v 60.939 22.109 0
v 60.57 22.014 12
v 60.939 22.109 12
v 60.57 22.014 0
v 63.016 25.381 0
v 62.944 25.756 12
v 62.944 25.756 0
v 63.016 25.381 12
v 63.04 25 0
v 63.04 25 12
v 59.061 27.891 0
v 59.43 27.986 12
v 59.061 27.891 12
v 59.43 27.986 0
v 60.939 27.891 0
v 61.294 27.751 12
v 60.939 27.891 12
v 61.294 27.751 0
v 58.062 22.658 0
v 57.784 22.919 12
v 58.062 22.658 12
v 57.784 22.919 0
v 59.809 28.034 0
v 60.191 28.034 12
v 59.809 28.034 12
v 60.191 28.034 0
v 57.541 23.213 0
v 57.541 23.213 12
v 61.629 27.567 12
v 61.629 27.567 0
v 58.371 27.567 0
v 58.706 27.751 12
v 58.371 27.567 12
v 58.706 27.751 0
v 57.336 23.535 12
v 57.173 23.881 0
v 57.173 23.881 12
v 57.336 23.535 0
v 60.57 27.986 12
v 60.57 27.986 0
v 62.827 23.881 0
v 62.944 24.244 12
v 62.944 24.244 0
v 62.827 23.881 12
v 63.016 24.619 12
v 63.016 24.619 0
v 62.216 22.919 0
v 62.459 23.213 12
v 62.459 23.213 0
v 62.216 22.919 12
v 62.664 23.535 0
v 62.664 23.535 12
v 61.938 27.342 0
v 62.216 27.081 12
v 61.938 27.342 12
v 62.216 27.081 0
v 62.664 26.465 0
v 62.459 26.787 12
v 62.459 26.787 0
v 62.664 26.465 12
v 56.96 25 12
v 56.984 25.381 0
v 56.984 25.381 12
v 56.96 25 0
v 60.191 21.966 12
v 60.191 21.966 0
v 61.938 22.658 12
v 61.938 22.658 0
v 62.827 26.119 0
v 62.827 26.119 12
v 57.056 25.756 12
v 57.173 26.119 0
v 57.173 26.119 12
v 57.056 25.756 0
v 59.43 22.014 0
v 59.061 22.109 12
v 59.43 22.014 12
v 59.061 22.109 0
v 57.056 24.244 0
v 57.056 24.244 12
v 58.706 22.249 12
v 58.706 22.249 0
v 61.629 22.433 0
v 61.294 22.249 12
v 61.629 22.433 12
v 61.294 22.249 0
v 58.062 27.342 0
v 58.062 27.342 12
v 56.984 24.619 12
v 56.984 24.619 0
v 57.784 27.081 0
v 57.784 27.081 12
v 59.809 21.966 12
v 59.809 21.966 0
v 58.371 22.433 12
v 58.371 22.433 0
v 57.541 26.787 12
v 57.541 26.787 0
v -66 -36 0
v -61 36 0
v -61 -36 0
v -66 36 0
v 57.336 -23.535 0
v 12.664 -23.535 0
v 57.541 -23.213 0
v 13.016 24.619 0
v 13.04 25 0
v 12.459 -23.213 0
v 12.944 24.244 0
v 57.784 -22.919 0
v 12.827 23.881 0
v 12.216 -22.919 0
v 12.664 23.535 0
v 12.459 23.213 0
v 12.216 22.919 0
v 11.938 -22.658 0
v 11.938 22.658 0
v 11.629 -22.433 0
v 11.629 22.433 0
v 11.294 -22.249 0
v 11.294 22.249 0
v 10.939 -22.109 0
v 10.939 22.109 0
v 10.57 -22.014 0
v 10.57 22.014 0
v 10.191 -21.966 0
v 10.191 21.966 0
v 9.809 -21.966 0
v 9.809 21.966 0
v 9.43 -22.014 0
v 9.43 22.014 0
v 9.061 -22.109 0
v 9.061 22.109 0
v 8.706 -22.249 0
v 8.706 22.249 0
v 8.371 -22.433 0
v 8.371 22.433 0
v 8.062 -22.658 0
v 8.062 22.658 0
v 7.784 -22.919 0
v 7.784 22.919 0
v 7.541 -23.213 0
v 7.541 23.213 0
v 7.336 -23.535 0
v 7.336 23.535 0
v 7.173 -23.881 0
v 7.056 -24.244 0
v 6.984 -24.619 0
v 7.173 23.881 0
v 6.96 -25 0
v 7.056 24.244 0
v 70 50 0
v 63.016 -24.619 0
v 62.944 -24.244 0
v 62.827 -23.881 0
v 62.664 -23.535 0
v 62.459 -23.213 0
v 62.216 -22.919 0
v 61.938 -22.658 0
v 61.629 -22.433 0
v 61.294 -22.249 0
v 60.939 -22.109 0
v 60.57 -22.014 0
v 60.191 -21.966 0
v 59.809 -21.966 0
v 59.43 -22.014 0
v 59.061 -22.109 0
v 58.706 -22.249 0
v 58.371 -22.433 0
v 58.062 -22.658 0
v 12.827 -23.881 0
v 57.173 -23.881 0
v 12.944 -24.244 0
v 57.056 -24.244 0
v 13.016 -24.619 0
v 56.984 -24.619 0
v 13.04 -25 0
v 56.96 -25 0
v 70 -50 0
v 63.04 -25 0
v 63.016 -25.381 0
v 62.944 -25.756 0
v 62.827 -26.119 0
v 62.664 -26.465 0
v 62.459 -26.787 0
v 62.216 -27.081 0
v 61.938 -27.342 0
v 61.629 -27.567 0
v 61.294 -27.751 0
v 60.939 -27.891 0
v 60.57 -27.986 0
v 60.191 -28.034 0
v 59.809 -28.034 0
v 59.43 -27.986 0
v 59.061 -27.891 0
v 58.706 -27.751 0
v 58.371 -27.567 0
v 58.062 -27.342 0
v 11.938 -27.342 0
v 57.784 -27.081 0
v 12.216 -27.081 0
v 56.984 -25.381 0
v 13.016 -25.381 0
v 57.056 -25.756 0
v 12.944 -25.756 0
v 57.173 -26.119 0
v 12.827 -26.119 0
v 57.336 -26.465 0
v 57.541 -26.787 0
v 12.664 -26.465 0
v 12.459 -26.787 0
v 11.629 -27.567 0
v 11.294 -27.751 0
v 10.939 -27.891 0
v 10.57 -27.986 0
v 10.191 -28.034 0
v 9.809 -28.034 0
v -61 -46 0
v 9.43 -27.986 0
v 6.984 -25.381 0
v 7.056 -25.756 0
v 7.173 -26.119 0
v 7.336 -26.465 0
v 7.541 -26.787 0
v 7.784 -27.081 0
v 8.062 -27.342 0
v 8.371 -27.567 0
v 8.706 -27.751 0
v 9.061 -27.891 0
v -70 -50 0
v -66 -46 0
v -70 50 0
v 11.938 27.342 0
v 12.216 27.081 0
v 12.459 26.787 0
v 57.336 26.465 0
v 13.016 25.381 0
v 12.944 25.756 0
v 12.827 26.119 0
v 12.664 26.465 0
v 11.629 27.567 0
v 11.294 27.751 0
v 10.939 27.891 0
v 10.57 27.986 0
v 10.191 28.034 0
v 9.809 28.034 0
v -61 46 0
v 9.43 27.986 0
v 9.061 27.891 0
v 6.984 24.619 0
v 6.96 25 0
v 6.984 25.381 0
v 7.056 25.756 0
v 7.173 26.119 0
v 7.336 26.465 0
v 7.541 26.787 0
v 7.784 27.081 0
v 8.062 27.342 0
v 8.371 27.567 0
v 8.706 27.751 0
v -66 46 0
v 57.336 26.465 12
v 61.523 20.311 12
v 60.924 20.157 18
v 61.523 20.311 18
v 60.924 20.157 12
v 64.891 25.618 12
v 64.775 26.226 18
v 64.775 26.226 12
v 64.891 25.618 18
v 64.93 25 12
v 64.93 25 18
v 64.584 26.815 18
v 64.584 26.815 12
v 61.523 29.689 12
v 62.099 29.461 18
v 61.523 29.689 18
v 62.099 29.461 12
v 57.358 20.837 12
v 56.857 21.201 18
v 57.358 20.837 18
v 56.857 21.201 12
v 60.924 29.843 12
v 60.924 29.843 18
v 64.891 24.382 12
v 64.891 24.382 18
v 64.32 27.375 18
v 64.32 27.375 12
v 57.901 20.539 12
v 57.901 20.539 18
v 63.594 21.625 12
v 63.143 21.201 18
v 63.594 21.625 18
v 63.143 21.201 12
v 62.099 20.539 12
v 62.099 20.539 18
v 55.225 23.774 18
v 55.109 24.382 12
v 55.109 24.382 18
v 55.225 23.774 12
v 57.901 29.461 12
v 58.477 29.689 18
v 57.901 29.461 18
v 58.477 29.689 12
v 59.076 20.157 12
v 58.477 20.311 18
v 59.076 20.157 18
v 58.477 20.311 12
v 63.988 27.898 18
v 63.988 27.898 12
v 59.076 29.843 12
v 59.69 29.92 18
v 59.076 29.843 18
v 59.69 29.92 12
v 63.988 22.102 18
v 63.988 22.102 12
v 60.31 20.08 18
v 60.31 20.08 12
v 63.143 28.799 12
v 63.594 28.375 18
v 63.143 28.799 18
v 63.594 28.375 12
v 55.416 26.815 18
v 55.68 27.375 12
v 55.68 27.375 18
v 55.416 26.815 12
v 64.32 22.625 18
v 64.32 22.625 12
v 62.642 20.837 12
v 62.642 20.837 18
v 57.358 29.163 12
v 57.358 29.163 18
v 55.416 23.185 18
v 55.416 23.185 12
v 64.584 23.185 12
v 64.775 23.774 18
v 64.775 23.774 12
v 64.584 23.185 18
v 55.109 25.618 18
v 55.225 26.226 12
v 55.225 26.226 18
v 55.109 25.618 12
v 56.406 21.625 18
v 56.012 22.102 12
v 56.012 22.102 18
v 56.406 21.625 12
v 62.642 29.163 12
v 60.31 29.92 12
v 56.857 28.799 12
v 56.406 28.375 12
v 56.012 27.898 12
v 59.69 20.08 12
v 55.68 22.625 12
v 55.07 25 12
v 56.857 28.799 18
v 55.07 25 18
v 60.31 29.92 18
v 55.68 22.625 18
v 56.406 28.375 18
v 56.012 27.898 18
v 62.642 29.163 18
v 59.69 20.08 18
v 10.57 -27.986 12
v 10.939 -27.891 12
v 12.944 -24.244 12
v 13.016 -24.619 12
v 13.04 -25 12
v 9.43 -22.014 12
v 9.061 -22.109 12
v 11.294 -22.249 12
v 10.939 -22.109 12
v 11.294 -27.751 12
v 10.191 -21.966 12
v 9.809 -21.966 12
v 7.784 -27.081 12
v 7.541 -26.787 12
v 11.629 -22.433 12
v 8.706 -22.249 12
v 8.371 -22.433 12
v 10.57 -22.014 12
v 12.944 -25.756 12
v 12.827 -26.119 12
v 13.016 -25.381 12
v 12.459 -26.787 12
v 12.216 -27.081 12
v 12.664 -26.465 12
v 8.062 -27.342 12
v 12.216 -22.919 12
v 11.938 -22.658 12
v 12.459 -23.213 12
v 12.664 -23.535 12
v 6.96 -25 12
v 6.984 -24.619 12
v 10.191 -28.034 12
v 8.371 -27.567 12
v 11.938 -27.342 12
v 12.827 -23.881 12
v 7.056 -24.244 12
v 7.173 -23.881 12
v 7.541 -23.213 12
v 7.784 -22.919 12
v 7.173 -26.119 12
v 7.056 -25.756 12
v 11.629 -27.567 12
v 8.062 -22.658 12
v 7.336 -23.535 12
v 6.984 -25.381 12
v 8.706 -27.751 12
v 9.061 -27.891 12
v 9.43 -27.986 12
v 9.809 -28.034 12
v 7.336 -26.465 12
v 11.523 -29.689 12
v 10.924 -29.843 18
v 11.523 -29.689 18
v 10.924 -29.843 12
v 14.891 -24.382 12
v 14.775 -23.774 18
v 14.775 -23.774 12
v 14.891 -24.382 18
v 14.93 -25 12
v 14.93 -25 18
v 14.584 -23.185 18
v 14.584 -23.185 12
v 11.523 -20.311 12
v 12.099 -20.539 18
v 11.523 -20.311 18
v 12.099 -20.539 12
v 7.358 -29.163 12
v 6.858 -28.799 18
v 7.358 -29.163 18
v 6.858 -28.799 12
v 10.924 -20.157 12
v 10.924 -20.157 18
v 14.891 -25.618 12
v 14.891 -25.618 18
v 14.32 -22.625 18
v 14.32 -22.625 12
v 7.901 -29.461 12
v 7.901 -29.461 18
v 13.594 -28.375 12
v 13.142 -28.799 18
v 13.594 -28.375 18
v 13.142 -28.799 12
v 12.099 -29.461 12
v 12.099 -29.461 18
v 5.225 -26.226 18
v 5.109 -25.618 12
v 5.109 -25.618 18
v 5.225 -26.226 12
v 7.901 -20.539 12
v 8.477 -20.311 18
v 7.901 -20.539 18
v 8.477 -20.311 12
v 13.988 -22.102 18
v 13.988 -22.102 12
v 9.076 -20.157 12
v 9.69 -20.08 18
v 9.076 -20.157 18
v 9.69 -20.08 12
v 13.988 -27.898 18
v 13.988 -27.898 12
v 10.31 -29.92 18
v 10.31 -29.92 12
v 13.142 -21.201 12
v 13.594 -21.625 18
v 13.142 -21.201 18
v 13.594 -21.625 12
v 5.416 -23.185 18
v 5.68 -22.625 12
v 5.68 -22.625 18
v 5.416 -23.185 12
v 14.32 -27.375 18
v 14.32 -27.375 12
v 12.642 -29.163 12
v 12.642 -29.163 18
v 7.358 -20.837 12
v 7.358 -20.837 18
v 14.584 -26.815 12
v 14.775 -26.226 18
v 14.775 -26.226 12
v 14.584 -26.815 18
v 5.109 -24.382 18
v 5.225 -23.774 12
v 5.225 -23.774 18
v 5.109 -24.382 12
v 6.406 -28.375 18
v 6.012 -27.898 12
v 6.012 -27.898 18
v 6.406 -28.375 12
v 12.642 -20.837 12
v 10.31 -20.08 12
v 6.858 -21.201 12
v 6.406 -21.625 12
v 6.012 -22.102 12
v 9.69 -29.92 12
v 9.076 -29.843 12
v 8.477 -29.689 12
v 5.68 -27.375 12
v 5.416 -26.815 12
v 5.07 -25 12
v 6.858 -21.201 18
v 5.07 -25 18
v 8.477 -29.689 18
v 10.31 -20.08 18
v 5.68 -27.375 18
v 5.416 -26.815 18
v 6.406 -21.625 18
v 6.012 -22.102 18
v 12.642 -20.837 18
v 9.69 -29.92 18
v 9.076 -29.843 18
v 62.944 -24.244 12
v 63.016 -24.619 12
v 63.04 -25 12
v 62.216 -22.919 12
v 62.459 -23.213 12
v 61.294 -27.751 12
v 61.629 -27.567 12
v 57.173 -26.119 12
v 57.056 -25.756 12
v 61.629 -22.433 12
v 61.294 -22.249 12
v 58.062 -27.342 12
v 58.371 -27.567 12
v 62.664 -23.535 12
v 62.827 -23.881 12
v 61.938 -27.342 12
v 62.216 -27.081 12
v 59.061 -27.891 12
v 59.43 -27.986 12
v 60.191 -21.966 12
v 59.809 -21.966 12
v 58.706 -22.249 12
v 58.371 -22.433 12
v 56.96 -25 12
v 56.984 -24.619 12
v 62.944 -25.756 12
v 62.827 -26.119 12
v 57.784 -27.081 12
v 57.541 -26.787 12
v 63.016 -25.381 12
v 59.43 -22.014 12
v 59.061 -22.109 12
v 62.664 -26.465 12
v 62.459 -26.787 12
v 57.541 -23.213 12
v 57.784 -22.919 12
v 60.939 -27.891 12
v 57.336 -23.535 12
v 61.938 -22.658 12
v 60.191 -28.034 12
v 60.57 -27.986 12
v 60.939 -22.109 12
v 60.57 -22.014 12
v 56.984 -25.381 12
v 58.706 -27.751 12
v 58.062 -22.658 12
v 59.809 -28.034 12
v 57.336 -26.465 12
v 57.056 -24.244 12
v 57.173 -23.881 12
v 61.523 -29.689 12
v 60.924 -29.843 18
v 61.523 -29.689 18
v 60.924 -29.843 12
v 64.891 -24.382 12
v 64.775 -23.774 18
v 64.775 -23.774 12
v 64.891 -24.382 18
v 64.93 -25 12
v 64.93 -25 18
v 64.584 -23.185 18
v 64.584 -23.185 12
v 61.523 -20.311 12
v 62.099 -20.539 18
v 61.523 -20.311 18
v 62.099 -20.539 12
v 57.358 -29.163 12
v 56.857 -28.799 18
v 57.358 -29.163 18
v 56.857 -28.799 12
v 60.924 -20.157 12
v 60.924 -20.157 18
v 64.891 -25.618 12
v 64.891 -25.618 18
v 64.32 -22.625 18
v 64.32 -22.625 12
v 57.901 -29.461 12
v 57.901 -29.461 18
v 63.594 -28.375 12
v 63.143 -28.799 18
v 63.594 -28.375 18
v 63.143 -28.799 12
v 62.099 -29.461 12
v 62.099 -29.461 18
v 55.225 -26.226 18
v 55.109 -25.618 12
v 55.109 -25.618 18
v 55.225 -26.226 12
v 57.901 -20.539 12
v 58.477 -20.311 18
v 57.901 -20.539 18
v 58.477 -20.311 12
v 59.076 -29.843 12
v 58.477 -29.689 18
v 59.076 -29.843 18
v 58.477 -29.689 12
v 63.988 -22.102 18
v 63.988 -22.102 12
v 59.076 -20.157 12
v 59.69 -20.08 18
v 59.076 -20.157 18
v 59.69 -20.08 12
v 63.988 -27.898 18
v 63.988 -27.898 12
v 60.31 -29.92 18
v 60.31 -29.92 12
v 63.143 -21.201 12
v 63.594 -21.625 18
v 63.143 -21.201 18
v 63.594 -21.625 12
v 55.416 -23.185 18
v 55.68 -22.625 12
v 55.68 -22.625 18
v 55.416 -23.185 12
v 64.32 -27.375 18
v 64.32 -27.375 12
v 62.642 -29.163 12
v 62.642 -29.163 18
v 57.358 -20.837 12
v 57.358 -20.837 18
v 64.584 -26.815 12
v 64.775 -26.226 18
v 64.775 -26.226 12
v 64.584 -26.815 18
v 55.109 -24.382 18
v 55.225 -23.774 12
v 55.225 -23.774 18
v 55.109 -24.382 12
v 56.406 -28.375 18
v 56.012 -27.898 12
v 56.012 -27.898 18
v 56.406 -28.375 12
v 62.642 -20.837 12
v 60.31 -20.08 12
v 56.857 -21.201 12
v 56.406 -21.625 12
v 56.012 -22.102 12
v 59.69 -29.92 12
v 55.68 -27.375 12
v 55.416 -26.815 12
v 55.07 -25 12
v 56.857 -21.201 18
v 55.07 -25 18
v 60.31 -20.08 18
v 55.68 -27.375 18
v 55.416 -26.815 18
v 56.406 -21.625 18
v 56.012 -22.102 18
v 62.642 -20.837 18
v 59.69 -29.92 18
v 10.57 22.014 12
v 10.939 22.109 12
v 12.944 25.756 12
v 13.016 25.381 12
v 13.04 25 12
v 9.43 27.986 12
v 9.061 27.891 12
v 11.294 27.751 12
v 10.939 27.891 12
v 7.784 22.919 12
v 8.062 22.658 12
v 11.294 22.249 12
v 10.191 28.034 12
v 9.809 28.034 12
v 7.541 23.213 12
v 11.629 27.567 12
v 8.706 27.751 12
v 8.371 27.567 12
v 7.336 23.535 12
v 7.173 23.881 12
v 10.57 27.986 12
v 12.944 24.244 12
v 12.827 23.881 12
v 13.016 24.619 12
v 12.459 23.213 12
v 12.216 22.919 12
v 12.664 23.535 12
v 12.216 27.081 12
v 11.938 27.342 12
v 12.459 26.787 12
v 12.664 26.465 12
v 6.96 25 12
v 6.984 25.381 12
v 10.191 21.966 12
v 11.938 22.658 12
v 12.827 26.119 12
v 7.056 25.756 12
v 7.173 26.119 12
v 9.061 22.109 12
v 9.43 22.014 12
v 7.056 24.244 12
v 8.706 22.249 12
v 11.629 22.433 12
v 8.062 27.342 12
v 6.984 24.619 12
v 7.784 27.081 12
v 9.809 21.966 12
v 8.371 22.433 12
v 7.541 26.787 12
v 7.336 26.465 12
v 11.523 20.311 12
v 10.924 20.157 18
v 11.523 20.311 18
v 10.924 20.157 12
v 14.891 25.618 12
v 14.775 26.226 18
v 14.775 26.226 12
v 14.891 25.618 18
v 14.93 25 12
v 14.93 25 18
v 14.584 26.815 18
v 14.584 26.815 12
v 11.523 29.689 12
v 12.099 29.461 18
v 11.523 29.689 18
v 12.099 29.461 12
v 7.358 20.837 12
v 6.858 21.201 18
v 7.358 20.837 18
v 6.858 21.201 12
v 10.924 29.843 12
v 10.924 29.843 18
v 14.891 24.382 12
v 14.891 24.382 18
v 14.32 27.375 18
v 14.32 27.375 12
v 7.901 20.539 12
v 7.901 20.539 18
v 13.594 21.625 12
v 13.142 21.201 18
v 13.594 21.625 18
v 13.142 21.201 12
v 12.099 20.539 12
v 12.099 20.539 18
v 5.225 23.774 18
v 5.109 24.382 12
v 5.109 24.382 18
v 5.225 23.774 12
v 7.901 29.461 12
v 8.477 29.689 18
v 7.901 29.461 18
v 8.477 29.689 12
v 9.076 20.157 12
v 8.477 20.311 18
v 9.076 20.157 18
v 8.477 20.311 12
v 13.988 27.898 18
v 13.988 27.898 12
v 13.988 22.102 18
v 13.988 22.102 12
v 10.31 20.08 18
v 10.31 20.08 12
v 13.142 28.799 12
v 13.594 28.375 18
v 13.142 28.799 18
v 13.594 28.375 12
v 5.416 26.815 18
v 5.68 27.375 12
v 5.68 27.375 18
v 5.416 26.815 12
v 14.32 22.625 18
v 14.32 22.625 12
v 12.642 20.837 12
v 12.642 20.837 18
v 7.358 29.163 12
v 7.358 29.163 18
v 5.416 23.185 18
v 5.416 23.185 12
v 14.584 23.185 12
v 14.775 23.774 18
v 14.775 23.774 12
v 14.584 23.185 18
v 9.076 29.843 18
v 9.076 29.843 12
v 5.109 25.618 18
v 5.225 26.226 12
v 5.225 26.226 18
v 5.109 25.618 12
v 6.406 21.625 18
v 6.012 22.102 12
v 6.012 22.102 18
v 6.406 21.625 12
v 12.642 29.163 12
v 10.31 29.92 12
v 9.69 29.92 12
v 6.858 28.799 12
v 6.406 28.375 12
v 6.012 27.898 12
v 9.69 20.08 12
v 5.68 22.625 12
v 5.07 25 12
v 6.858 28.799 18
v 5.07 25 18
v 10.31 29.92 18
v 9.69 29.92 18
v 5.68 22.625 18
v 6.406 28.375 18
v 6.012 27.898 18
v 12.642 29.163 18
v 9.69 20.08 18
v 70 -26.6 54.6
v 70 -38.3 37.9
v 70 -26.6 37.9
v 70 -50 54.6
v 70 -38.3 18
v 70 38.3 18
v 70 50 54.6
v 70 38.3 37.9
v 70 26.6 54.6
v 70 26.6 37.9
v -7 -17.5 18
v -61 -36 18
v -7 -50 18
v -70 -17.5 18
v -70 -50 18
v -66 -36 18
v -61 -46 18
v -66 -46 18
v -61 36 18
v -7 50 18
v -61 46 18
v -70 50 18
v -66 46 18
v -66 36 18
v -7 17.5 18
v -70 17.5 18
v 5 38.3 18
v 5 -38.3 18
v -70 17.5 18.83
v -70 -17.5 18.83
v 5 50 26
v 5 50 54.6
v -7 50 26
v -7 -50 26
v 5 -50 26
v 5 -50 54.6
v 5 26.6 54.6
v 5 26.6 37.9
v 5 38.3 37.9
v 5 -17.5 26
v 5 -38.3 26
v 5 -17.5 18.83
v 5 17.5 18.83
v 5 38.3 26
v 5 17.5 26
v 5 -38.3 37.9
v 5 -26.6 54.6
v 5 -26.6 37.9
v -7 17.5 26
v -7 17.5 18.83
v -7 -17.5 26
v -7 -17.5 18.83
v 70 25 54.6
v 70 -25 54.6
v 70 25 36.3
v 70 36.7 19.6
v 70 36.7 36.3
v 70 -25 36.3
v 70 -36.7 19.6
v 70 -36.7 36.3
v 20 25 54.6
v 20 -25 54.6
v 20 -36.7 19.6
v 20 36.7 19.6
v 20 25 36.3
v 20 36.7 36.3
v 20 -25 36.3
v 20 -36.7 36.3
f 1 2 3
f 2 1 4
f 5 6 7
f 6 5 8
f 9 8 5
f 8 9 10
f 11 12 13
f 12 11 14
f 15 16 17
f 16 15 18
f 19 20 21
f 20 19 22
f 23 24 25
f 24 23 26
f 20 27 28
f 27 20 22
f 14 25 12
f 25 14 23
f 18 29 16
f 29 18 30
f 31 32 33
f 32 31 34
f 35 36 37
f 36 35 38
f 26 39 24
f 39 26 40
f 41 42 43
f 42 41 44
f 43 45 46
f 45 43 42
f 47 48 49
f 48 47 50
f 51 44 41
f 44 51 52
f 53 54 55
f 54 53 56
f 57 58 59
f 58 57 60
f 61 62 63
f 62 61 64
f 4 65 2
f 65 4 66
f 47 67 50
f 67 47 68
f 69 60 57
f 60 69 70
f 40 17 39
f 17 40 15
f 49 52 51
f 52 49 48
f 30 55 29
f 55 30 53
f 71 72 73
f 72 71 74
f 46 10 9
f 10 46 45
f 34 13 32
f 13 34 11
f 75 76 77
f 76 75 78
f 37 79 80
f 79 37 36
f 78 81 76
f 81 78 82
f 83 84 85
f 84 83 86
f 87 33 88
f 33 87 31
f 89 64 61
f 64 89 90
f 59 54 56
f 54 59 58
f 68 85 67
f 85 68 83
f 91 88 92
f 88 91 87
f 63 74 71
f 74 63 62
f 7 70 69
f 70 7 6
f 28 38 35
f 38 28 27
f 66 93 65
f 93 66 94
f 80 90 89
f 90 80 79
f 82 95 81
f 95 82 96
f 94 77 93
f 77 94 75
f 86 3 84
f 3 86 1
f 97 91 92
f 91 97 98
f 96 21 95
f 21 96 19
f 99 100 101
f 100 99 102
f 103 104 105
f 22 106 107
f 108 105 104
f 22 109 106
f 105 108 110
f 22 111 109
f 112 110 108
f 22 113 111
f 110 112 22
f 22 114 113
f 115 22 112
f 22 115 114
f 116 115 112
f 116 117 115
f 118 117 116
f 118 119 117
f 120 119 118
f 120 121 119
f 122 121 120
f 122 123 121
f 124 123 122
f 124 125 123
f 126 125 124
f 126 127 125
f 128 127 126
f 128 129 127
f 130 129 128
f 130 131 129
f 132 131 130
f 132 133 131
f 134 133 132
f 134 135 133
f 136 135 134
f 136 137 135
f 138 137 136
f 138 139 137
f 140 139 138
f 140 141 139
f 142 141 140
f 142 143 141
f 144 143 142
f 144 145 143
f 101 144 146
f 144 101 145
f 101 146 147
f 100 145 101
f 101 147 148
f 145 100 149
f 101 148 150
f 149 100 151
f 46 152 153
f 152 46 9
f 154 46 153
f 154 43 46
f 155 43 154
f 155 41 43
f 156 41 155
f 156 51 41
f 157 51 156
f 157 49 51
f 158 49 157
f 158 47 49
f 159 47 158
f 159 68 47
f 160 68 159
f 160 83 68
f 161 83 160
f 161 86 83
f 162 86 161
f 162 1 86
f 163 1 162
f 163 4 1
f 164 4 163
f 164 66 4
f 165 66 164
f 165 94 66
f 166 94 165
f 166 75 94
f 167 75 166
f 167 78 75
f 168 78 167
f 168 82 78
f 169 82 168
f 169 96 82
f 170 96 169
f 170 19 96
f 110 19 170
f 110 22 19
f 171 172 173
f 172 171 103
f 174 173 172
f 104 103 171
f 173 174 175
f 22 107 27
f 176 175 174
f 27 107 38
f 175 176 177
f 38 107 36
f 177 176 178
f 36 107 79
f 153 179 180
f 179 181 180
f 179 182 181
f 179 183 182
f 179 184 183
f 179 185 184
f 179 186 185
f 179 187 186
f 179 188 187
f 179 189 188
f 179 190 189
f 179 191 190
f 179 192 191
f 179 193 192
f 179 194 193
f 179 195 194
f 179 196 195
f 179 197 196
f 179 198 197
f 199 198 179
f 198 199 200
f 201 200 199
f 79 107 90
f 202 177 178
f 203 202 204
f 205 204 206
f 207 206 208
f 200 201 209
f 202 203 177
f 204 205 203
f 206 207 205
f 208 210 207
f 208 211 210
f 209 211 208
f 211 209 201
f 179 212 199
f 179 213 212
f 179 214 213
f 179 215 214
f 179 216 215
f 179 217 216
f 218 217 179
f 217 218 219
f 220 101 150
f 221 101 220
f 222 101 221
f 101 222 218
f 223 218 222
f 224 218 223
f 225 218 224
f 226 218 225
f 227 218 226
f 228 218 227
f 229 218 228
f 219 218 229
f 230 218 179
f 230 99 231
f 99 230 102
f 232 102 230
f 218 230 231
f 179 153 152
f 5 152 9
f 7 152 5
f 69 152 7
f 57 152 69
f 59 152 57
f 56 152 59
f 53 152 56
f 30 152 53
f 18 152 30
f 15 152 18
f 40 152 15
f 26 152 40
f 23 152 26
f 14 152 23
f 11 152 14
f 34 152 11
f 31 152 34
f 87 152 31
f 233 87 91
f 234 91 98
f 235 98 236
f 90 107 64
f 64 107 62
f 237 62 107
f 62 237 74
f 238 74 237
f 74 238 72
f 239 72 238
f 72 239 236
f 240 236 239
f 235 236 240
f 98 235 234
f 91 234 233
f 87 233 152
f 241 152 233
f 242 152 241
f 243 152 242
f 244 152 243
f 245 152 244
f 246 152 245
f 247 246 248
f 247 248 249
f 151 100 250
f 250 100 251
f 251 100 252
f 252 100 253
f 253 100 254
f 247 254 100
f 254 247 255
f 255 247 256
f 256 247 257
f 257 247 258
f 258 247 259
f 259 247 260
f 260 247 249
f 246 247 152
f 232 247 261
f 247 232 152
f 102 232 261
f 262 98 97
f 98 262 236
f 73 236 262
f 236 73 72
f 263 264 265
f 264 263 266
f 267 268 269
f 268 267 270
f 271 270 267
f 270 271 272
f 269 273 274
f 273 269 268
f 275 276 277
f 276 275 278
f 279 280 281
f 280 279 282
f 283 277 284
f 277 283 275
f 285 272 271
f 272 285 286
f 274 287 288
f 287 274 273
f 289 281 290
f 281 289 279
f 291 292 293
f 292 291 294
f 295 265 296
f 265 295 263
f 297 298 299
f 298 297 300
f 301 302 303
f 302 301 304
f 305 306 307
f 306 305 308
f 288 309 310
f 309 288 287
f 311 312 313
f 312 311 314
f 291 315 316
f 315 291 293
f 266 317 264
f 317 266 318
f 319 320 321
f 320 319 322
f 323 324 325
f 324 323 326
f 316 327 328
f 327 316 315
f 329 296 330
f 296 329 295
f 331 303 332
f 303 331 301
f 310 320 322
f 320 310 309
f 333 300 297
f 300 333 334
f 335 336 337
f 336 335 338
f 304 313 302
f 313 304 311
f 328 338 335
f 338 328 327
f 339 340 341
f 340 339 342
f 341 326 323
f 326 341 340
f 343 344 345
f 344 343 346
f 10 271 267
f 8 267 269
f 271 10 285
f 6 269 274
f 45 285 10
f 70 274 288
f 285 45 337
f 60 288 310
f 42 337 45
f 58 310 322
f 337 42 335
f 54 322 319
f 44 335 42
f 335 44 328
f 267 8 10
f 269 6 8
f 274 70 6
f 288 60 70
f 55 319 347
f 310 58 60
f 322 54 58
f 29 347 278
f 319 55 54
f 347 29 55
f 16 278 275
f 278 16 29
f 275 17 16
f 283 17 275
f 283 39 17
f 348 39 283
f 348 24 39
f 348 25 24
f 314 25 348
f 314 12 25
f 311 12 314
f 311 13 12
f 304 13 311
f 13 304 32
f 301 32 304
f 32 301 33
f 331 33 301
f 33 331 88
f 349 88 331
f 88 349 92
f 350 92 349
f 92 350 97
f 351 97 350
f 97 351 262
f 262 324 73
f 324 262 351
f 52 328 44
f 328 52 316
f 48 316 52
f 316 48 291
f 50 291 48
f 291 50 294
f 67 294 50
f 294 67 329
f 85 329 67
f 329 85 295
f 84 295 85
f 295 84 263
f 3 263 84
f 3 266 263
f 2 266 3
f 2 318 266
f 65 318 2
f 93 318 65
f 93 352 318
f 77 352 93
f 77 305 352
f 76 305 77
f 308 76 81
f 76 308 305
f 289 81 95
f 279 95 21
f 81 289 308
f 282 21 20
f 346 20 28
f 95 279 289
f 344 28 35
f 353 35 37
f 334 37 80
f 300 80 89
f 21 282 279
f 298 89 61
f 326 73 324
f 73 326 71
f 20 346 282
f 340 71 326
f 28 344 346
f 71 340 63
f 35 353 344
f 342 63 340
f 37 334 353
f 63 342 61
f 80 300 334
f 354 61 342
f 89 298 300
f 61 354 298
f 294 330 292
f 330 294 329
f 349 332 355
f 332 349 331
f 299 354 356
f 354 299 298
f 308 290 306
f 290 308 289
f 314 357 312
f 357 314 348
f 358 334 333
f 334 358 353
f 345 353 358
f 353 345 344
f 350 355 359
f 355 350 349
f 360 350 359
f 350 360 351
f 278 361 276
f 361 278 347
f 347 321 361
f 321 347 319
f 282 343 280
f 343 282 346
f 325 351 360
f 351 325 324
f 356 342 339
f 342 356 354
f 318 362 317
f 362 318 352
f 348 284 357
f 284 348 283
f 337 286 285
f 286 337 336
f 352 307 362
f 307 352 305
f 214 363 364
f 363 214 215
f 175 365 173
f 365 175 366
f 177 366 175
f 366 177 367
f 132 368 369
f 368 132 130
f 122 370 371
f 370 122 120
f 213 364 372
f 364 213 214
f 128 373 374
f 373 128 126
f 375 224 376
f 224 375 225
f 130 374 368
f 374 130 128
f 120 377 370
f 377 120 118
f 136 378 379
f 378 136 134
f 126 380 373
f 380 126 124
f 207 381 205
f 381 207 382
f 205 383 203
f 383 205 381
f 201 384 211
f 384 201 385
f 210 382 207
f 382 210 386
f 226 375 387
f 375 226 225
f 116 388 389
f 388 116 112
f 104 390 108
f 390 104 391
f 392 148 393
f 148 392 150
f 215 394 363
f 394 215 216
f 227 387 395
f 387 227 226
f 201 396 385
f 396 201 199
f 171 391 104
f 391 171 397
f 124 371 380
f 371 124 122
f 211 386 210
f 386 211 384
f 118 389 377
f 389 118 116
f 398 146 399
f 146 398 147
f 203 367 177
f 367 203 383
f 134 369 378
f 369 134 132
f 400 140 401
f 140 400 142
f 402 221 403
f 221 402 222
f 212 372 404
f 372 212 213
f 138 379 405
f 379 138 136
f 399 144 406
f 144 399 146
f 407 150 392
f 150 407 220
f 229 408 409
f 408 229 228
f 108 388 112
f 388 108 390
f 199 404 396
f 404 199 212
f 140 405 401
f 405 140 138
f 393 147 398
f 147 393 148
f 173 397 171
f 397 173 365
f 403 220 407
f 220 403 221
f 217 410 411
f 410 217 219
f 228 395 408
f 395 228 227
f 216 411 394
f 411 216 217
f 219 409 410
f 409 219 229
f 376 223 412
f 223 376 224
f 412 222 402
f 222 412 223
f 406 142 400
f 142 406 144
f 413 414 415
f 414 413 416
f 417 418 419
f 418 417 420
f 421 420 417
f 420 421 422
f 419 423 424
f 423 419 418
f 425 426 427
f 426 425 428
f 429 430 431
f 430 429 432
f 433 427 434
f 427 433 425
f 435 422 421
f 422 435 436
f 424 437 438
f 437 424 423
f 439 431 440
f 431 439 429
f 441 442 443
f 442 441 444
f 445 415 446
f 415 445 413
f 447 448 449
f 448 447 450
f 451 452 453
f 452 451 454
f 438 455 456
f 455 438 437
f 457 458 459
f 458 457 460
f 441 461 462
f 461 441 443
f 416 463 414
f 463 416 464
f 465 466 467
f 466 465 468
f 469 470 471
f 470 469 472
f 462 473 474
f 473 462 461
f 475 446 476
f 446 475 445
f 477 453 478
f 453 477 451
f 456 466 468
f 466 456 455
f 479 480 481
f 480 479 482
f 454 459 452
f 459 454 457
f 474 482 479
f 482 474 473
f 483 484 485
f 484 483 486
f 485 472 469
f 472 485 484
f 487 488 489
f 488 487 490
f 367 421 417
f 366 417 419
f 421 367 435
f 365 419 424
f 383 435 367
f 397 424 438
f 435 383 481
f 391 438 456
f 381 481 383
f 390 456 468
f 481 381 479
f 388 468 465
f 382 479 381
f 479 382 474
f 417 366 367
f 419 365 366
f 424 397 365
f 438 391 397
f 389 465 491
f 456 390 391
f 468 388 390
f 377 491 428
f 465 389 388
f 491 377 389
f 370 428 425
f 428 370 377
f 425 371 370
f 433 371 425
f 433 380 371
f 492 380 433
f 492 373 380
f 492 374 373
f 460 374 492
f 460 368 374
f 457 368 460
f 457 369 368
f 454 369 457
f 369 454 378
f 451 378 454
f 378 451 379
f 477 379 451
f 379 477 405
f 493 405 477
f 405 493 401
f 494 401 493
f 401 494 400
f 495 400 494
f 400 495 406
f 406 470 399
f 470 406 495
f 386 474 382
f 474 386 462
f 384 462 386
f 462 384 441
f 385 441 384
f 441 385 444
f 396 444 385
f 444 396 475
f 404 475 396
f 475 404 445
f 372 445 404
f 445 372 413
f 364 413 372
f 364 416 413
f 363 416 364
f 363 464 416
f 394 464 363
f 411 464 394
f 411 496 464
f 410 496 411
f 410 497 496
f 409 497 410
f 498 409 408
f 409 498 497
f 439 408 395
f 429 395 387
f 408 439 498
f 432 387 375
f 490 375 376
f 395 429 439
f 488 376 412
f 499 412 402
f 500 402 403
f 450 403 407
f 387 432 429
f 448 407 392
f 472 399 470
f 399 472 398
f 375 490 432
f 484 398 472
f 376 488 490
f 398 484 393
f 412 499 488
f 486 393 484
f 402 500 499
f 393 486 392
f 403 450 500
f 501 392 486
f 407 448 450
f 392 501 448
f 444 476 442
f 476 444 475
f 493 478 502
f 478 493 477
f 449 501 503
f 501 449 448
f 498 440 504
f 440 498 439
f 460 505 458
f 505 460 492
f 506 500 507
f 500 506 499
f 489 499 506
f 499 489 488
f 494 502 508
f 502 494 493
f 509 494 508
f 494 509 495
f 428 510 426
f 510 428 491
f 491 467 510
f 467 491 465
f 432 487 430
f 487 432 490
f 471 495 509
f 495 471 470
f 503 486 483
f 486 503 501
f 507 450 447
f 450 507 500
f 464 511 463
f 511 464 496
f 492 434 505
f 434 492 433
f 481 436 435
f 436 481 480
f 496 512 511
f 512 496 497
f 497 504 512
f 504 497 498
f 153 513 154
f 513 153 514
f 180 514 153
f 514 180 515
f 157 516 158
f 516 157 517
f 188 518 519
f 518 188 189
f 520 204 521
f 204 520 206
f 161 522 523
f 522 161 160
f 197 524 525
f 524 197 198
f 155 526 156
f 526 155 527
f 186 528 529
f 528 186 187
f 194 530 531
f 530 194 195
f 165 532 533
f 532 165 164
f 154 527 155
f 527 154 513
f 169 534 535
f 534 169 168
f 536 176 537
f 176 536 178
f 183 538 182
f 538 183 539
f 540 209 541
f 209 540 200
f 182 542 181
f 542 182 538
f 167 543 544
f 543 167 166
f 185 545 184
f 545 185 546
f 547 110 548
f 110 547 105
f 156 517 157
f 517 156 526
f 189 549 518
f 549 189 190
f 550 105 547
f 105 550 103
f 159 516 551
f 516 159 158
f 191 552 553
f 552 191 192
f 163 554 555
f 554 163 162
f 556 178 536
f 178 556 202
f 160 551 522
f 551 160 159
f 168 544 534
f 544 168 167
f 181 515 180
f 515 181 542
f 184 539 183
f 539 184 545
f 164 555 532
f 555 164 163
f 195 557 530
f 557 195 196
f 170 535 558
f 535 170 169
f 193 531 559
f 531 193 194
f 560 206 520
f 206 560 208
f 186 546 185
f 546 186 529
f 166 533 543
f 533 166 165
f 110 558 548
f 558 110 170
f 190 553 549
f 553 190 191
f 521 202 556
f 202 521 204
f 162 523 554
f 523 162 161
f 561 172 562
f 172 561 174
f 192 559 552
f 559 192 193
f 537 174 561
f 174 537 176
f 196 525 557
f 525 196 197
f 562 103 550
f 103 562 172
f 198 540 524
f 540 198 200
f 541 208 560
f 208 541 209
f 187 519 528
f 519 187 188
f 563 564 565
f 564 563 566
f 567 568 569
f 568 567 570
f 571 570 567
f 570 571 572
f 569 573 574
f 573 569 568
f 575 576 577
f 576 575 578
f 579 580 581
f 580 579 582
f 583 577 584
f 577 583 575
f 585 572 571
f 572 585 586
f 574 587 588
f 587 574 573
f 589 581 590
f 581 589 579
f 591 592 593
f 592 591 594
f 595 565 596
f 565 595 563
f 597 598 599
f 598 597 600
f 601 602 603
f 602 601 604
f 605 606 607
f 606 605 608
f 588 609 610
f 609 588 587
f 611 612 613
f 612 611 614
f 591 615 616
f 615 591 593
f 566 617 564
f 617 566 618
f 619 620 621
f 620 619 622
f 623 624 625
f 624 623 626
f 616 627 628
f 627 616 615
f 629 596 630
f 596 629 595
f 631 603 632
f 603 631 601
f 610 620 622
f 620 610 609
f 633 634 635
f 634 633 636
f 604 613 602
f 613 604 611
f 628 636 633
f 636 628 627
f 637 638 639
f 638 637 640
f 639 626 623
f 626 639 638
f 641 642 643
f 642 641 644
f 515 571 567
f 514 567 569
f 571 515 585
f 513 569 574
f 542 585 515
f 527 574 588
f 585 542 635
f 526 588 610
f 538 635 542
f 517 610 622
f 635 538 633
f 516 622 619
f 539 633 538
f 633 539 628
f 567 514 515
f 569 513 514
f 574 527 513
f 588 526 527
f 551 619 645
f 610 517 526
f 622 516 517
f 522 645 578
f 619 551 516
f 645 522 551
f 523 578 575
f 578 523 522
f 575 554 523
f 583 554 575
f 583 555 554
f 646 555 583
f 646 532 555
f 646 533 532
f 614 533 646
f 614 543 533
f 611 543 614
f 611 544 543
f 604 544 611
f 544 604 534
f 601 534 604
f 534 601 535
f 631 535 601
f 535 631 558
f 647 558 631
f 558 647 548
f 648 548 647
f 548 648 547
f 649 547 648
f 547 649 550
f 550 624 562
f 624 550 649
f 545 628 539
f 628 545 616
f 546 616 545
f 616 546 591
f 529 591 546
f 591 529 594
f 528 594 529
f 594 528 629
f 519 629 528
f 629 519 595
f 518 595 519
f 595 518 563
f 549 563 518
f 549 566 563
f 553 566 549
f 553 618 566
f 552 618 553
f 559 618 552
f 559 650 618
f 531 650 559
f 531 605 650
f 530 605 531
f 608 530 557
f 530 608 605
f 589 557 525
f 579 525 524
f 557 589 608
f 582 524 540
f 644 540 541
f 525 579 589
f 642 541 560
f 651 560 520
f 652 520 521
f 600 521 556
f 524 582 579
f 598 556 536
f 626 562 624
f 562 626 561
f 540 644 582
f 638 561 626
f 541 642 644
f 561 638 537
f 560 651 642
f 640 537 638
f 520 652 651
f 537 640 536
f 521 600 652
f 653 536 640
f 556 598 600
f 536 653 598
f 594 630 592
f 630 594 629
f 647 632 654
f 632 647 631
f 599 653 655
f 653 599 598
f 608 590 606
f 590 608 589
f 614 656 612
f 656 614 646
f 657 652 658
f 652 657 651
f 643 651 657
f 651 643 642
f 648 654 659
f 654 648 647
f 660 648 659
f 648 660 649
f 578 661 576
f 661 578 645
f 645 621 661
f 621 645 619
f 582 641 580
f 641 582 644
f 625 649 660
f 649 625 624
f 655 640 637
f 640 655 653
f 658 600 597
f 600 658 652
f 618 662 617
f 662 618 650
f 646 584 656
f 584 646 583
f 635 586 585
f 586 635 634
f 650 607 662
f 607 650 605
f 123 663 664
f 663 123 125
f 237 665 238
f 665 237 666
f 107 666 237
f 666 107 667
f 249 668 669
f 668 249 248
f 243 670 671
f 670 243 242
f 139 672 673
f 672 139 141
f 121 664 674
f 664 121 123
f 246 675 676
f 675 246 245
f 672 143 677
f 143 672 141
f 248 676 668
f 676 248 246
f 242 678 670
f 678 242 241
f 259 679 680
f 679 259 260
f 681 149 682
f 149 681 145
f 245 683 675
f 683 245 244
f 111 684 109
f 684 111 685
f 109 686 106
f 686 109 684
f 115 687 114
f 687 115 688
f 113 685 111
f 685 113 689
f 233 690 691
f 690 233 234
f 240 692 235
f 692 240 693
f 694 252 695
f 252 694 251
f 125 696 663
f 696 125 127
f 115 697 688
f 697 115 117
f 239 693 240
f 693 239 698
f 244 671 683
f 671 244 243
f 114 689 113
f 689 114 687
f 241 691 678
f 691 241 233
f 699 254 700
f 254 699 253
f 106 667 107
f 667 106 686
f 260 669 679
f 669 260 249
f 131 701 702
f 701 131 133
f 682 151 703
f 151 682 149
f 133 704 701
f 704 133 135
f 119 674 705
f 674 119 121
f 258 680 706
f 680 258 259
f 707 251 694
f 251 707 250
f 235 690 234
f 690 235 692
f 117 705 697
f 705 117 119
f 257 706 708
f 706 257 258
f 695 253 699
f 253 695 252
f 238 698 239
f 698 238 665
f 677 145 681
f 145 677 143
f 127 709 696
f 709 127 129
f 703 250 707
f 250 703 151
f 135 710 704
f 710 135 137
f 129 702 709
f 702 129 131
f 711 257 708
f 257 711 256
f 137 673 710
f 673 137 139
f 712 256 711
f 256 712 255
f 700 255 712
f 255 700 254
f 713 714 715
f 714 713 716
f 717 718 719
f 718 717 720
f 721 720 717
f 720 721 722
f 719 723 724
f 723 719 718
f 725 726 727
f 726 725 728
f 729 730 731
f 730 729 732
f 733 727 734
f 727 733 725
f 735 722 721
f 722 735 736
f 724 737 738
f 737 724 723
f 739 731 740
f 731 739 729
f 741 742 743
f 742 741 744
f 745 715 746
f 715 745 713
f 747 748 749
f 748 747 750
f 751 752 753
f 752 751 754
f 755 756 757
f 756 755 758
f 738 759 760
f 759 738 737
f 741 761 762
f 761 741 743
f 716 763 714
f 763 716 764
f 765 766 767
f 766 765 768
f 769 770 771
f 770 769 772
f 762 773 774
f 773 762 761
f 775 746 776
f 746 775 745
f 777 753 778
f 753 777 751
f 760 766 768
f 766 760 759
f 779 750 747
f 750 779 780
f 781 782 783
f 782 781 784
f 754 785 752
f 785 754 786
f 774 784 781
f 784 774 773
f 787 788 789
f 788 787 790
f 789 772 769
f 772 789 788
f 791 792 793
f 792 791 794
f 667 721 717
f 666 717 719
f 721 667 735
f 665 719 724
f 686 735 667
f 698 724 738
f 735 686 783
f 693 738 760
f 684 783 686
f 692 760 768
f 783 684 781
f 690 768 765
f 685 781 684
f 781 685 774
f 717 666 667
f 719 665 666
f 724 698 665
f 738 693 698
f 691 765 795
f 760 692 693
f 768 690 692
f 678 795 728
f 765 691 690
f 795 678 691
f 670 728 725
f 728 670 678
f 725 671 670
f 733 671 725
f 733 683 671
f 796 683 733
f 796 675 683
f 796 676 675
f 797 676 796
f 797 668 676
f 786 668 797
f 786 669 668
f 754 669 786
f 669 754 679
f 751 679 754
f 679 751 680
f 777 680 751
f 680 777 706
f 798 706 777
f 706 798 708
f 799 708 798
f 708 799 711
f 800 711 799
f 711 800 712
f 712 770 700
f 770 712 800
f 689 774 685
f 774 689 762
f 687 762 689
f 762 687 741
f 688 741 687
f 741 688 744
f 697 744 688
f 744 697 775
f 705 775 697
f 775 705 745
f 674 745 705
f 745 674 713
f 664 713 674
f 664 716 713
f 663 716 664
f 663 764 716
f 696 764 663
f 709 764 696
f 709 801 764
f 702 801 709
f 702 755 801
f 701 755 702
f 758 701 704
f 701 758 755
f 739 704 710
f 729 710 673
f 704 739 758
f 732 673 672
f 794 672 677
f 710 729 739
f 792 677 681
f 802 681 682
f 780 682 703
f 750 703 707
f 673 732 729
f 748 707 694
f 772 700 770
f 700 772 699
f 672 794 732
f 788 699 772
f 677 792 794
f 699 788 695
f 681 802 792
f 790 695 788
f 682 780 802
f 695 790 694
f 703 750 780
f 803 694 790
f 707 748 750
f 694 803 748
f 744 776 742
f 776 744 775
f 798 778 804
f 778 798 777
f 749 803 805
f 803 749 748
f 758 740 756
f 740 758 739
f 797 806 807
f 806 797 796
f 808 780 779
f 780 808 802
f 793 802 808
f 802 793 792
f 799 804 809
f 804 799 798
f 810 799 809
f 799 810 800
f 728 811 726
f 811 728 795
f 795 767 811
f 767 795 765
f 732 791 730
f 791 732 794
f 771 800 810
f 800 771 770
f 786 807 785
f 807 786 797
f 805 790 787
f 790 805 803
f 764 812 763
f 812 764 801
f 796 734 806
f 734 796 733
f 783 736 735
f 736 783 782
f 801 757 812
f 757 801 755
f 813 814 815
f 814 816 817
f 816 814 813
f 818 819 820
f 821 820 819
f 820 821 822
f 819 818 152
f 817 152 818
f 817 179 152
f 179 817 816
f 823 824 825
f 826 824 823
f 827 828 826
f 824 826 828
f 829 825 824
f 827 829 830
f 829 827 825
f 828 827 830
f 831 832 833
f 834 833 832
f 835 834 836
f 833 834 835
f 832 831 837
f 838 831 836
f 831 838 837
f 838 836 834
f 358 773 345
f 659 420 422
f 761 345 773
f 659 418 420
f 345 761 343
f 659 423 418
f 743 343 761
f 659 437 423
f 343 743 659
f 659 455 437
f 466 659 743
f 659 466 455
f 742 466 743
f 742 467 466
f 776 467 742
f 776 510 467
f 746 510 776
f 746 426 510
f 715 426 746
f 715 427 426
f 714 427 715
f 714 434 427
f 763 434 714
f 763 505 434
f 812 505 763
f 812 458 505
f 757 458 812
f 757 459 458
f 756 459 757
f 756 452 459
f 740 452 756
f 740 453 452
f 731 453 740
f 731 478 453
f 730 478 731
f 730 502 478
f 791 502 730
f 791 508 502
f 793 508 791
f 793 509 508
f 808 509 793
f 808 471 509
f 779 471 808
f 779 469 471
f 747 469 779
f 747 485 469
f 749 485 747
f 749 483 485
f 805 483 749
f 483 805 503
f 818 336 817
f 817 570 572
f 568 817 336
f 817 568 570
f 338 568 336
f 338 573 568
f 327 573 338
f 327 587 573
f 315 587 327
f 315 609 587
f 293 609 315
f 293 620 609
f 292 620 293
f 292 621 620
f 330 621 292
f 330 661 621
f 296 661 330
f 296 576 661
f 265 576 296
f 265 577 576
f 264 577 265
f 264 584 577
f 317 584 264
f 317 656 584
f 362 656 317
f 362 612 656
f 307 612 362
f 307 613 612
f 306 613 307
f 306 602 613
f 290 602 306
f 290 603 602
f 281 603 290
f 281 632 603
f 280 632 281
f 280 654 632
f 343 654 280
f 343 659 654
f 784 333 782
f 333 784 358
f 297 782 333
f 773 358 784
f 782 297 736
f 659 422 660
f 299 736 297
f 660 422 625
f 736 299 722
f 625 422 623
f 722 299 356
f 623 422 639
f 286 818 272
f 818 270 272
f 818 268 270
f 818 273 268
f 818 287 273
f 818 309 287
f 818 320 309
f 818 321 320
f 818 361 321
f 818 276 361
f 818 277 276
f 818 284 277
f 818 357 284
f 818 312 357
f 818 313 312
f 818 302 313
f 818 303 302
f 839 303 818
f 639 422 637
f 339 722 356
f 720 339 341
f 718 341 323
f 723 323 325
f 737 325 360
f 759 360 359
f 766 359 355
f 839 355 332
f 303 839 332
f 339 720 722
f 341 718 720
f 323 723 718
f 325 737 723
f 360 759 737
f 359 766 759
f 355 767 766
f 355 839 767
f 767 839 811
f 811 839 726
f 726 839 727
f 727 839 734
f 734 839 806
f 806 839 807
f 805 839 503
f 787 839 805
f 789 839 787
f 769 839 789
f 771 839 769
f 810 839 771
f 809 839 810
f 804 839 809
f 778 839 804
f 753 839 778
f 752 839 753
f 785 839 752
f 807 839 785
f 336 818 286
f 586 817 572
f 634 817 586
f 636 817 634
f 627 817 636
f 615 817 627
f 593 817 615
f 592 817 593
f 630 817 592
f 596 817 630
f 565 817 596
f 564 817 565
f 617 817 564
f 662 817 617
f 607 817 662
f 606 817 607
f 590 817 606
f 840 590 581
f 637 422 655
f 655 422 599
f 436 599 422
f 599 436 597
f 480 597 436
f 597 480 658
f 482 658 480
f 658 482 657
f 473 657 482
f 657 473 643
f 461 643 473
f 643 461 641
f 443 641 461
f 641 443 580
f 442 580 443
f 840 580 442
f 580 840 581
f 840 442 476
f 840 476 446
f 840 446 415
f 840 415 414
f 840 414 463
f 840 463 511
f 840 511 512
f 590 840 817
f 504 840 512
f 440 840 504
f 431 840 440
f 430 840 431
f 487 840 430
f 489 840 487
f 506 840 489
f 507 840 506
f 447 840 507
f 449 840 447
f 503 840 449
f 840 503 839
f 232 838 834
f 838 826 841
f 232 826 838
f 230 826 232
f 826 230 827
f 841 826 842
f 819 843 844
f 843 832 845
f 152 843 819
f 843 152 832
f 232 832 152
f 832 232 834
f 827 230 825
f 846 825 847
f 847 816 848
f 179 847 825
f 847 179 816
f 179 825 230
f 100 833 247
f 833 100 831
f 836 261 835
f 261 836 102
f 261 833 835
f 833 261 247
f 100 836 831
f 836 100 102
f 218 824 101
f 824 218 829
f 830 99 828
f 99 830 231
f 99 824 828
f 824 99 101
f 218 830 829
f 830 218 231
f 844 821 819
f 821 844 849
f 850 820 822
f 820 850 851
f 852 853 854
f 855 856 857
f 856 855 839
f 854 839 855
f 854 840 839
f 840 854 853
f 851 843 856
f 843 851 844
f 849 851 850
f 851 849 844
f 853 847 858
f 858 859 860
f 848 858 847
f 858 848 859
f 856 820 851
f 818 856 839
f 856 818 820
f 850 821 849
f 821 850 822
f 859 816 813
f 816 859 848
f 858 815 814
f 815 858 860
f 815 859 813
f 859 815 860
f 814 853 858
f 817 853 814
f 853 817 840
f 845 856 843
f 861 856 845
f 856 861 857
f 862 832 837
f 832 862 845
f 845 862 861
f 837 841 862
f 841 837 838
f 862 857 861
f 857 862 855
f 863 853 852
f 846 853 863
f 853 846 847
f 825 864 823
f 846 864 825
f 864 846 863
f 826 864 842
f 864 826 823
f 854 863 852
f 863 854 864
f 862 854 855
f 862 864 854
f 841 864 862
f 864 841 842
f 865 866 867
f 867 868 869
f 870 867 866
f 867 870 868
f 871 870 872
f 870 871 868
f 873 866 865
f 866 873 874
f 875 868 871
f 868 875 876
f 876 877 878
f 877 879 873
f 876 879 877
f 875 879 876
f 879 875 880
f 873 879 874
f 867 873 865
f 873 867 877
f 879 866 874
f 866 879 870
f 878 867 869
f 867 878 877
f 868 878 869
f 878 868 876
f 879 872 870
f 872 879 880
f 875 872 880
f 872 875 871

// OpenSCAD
$fn = 50;

render_platform = true;
render_stage = true;
render_teflon = false;
render_solenoid = false;

// all units in millimeters

solenoid_body_color = "Red";
// dimensions for solenoid at http://www.amazon.com/gp/product/B00DUYPQHU/ref=oh_aui_detailpage_o03_s00?ie=UTF8&psc=1
solenoid_body_height = 30;
solenoid_body_width = 25;
solenoid_body_length = 51;

solenoid_rod_color = "Black";
solenoid_stroke = 15;

platform_color = "LightBlue";
platform_height = 18;
platform_bevel_radius = 2;
platform_width = 100;
platform_length = 140;
platform_anchor_tolerance = 0.04;
platform_anchor_r = 3 + platform_anchor_tolerance; // half of d plus 0.04 tolerance
echo("platform_anchor_r = ", platform_anchor_r);
platform_anchor_rk = 9.78 / 2 + platform_anchor_tolerance; // half of dk plus 0.04 tolerance
echo("platform_anchor_rk = ", platform_anchor_rk);
platform_anchor_k = (5.7 + 0.3) * 2; // 0.3mm extra depth, and k is doubled for modeling
echo("platform_anchor_k = ", platform_anchor_k);
platform_anchor_spacing = 50;
platform_anchor_setback = 10;
platform_bumper_height = 8;
platform_bumper_width = 12;
platform_wiring_slot_length = 5;
platform_wiring_slot_width = 10;
platform_wiring_slot_margin = 4;

stage_color = "LightGreen";
stage_height = 35;
stage_bevel_radius = 2;
stage_width = 50;
stage_length = 50;

teflon_color = "LightGray";
teflon_pad_thickness = 0.8;
teflon_bottom_pad_length = stage_length + solenoid_stroke;
echo("teflon_bottom_pad_length = ", teflon_bottom_pad_length);

stage_rail_length = stage_length;
echo("stage_rail_length = ", stage_rail_length);
stage_rail_width = (platform_width - stage_width) / 4 - teflon_pad_thickness;
echo("stage_rail_width = ", stage_rail_width);
stage_rail_height = stage_height / 2 - teflon_pad_thickness;
echo("stage_rail_height = ", stage_rail_height);

platform_side_length = teflon_bottom_pad_length;
echo("platform_side_length = ", platform_side_length);
platform_side_height = stage_height + 2 * teflon_pad_thickness;
echo("platform_side_height = ", platform_side_height);
platform_side_width = stage_rail_width;
echo("platform_side_width = ", platform_side_width);

platform_rail_length = teflon_bottom_pad_length;
echo("platform_rail_length = ", platform_rail_length);
platform_rail_height = stage_height - stage_rail_height - 2 * teflon_pad_thickness;
echo("platform_rail_height = ", platform_rail_height);
platform_rail_width = (platform_width - stage_width) / 2 - platform_side_width - 2 * teflon_pad_thickness;
echo("platform_rail_width = ", platform_rail_width);

teflon_pad_width = stage_width + 2 * stage_rail_width;
echo("teflon_pad_width = ", teflon_pad_width);

solenoid_podium_length = platform_length - platform_rail_length;
echo("solenoid_podium_length = ", solenoid_podium_length);
solenoid_podium_width = solenoid_body_width + 10;
echo("solenoid_podium_width = ", solenoid_podium_width);
stage_center_of_mass_y = (stage_height * stage_width * stage_height / 2 + 2 * stage_rail_height * stage_rail_width * stage_rail_height / 2) / (stage_height * stage_width + 2 * stage_rail_height * stage_rail_width);
echo("stage_center_of_mass_y = ", stage_center_of_mass_y);
solenoid_podium_height = stage_center_of_mass_y - solenoid_body_height / 2;
echo("solenoid_podium_height = ", solenoid_podium_height);

if (render_platform) {
	// platform
	color(platform_color) {
		difference() {
			translate([0, 0, platform_height / 2])
				cube([platform_length, platform_width, platform_height], center = true);

	// anchor holes
			translate([platform_anchor_spacing + platform_anchor_setback, platform_anchor_spacing / 2, platform_height]) {
				cylinder(r = platform_anchor_r, h = 2 * platform_height, center = true);
				cylinder(r = platform_anchor_rk, h = platform_anchor_k, center = true);
			}
			translate([platform_anchor_setback, -platform_anchor_spacing / 2, platform_height]) {
				cylinder(r = platform_anchor_r, h = 2 * platform_height, center = true);
				cylinder(r = platform_anchor_rk, h = platform_anchor_k, center = true);
			}
			translate([platform_anchor_spacing + platform_anchor_setback, -platform_anchor_spacing / 2, platform_height]) {
				cylinder(r = platform_anchor_r, h = 2 * platform_height, center = true);
				cylinder(r = platform_anchor_rk, h = platform_anchor_k, center = true);
			}
			translate([platform_anchor_setback, platform_anchor_spacing / 2, platform_height]) {
				cylinder(r = platform_anchor_r, h = 2 * platform_height, center = true);
				cylinder(r = platform_anchor_rk, h = platform_anchor_k, center = true);
			}

	// wiring access slots
			translate([-(platform_length - platform_wiring_slot_length) / 2 + platform_wiring_slot_margin, (platform_width - platform_wiring_slot_width) / 2 - platform_wiring_slot_margin, 0]) {
				cube([platform_wiring_slot_length, platform_wiring_slot_width, 2 * platform_height], center = true);
			}

			translate([-(platform_length - platform_wiring_slot_length) / 2 + platform_wiring_slot_margin, -(platform_width - platform_wiring_slot_width) / 2 + platform_wiring_slot_margin, 0]) {
				cube([platform_wiring_slot_length, platform_wiring_slot_width, 2 * platform_height], center = true);
			}
		}
	}
	
	// platform rails
	color(platform_color) {
		translate([(platform_length - platform_rail_length) / 2,  (stage_width + stage_rail_width) / 2 + 2 * teflon_pad_thickness, platform_height + stage_height + 2 * teflon_pad_thickness - platform_rail_height / 2])
			cube([platform_rail_length, platform_rail_width, platform_rail_height], center = true);
	}
	
	color(platform_color) {
		translate([(platform_length - platform_rail_length) / 2,  -(stage_width + stage_rail_width) / 2 - 2 * teflon_pad_thickness, platform_height + stage_height + 2 * teflon_pad_thickness - platform_rail_height / 2])
			cube([platform_rail_length, platform_rail_width, platform_rail_height], center = true);
	}
	
	// platform sides
	
	color(platform_color) {
		translate([(platform_length - platform_rail_length) / 2,  (3 * stage_rail_width + stage_width) / 2 + 2 * teflon_pad_thickness, platform_height + teflon_pad_thickness + stage_height / 2])
			cube([platform_side_length, platform_side_width, platform_side_height], center = true);
	}
	
	color(platform_color) {
		translate([(platform_length - platform_rail_length) / 2,  -(3 * stage_rail_width + stage_width) / 2 - 2 * teflon_pad_thickness, platform_height + teflon_pad_thickness + stage_height / 2])
			cube([platform_side_length, platform_side_width, platform_side_height], center = true);
	}
	
	// platform stage bumper
	color(platform_color) {
		translate([-(platform_rail_length - platform_length / 2 + platform_bumper_width / 2), (platform_width + solenoid_podium_width) / 4, platform_height + platform_bumper_height / 2])
			cube([platform_bumper_width, (platform_width - solenoid_podium_width) / 2, platform_bumper_height], center = true);
	}
	
	color(platform_color) {
		translate([-(platform_rail_length - platform_length / 2 + platform_bumper_width / 2), -(platform_width + solenoid_podium_width) / 4, platform_height + platform_bumper_height / 2])
			cube([platform_bumper_width, (platform_width - solenoid_podium_width) / 2, platform_bumper_height], center = true);
	}
	
	// solenoid podium
	color(platform_color) {
		translate([-(platform_length - solenoid_podium_length) / 2, 0, platform_height + solenoid_podium_height / 2])
			cube([solenoid_podium_length, solenoid_podium_width, solenoid_podium_height], center = true);
	}
}

if (render_teflon) {
	// bottom teflon pad
	color(teflon_color) {
		translate([(platform_length - teflon_bottom_pad_length) / 2, 0, platform_height + teflon_pad_thickness / 2])
			cube([teflon_bottom_pad_length, teflon_pad_width, teflon_pad_thickness], center = true);
	}
	
	// top teflon pad
	color(teflon_color) {
		translate([(platform_length - stage_length) / 2, 0, platform_height + 3 * teflon_pad_thickness / 2])
			cube([stage_length, teflon_pad_width, teflon_pad_thickness], center = true);
	}
	
	// teflon on rails
	color(teflon_color) {
		translate([(platform_length - platform_rail_length) / 2,  (stage_width + stage_rail_width) / 2 + 2 * teflon_pad_thickness, platform_height + stage_rail_height + 3.5 * teflon_pad_thickness])
			cube([platform_rail_length, stage_rail_width, teflon_pad_thickness], center = true);
	}
	
	color(teflon_color) {
		translate([(platform_length - stage_rail_length) / 2,  (stage_width + stage_rail_width) / 2, platform_height + stage_rail_height + 2.5 * teflon_pad_thickness])
			cube([stage_rail_length, stage_rail_width, teflon_pad_thickness], center = true);
	}
	
	color(teflon_color) {
		translate([(platform_length - platform_rail_length) / 2,  -(stage_width + stage_rail_width) / 2 - 2 * teflon_pad_thickness, platform_height + stage_rail_height + 3.5 * teflon_pad_thickness])
			cube([platform_rail_length, stage_rail_width, teflon_pad_thickness], center = true);
	}
	
	color(teflon_color) {
		translate([(platform_length - stage_rail_length) / 2,  -(stage_width + stage_rail_width) / 2, platform_height + stage_rail_height + 2.5 * teflon_pad_thickness])
			cube([stage_rail_length, stage_rail_width, teflon_pad_thickness], center = true);
	}
	
	// teflon on sides
	color(teflon_color) {
		translate([(platform_length - platform_rail_length) / 2,  stage_width / 2 + stage_rail_width + 3 * teflon_pad_thickness / 2, platform_height + 2 * teflon_pad_thickness + stage_rail_height / 2])
			cube([platform_rail_length, teflon_pad_thickness, stage_rail_height + 2 * teflon_pad_thickness], center = true);
	}
	
	color(teflon_color) {
		translate([(platform_length - stage_rail_length) / 2,  stage_width / 2 + stage_rail_width + teflon_pad_thickness / 2, platform_height + 2 * teflon_pad_thickness + stage_rail_height / 2])
			cube([stage_rail_length, teflon_pad_thickness, stage_rail_height + 2 * teflon_pad_thickness], center = true);
	}
	
	color(teflon_color) {
		translate([(platform_length - platform_rail_length) / 2,  -(stage_width / 2 + stage_rail_width + 3 * teflon_pad_thickness / 2), platform_height + 2 * teflon_pad_thickness + stage_rail_height / 2])
			cube([platform_rail_length, teflon_pad_thickness, stage_rail_height + 2 * teflon_pad_thickness], center = true);
	}
	
	color(teflon_color) {
		translate([(platform_length - stage_rail_length) / 2,  -(stage_width / 2 + stage_rail_width + teflon_pad_thickness / 2), platform_height + 2 * teflon_pad_thickness + stage_rail_height / 2])
			cube([stage_rail_length, teflon_pad_thickness, stage_rail_height + 2 * teflon_pad_thickness], center = true);
	}
}

if (render_stage) {
	// stage 
	color(stage_color) {
		difference() {
			translate([(platform_length - stage_length) / 2, 0, platform_height + stage_height / 2 + 2 * teflon_pad_thickness])
				cube([stage_length, stage_width, stage_height], center = true);
	// solenoid rod hole
			translate([0, 0, platform_height + solenoid_podium_height + solenoid_body_height / 2])
				rotate([0, 90, 0]) cylinder(r = 0.7, h = 16, center = true);
		}
	}
	
	// stage rails
	
	color(stage_color) {
		translate([(platform_length - stage_length) / 2, (stage_width + stage_rail_width) / 2, platform_height + 2 * teflon_pad_thickness + stage_rail_height / 2])
			cube([stage_length, stage_rail_width, stage_rail_height], center = true);
	}
	
	color(stage_color) {
		translate([(platform_length - stage_length) / 2, -(stage_width + stage_rail_width) / 2, platform_height + 2 * teflon_pad_thickness + stage_rail_height / 2])
			cube([stage_length, stage_rail_width, stage_rail_height], center = true);
	}
}

if (render_solenoid) {
	// solenoid body
	color(solenoid_body_color) {
		translate([-(solenoid_body_length / 2 + solenoid_stroke) + platform_length / 2 - platform_side_length, 0, platform_height + solenoid_podium_height + solenoid_body_height / 2])
			cube([solenoid_body_length, solenoid_body_width, solenoid_body_height], center = true);
	}
	
	// solenoid rod
	color(solenoid_rod_color) {
		translate([solenoid_stroke / 2 - solenoid_stroke, 0, platform_height + solenoid_podium_height + solenoid_body_height / 2])
		rotate([0, 90, 0])
			cylinder(r = 1, h = solenoid_stroke, center = true);
	}
}
